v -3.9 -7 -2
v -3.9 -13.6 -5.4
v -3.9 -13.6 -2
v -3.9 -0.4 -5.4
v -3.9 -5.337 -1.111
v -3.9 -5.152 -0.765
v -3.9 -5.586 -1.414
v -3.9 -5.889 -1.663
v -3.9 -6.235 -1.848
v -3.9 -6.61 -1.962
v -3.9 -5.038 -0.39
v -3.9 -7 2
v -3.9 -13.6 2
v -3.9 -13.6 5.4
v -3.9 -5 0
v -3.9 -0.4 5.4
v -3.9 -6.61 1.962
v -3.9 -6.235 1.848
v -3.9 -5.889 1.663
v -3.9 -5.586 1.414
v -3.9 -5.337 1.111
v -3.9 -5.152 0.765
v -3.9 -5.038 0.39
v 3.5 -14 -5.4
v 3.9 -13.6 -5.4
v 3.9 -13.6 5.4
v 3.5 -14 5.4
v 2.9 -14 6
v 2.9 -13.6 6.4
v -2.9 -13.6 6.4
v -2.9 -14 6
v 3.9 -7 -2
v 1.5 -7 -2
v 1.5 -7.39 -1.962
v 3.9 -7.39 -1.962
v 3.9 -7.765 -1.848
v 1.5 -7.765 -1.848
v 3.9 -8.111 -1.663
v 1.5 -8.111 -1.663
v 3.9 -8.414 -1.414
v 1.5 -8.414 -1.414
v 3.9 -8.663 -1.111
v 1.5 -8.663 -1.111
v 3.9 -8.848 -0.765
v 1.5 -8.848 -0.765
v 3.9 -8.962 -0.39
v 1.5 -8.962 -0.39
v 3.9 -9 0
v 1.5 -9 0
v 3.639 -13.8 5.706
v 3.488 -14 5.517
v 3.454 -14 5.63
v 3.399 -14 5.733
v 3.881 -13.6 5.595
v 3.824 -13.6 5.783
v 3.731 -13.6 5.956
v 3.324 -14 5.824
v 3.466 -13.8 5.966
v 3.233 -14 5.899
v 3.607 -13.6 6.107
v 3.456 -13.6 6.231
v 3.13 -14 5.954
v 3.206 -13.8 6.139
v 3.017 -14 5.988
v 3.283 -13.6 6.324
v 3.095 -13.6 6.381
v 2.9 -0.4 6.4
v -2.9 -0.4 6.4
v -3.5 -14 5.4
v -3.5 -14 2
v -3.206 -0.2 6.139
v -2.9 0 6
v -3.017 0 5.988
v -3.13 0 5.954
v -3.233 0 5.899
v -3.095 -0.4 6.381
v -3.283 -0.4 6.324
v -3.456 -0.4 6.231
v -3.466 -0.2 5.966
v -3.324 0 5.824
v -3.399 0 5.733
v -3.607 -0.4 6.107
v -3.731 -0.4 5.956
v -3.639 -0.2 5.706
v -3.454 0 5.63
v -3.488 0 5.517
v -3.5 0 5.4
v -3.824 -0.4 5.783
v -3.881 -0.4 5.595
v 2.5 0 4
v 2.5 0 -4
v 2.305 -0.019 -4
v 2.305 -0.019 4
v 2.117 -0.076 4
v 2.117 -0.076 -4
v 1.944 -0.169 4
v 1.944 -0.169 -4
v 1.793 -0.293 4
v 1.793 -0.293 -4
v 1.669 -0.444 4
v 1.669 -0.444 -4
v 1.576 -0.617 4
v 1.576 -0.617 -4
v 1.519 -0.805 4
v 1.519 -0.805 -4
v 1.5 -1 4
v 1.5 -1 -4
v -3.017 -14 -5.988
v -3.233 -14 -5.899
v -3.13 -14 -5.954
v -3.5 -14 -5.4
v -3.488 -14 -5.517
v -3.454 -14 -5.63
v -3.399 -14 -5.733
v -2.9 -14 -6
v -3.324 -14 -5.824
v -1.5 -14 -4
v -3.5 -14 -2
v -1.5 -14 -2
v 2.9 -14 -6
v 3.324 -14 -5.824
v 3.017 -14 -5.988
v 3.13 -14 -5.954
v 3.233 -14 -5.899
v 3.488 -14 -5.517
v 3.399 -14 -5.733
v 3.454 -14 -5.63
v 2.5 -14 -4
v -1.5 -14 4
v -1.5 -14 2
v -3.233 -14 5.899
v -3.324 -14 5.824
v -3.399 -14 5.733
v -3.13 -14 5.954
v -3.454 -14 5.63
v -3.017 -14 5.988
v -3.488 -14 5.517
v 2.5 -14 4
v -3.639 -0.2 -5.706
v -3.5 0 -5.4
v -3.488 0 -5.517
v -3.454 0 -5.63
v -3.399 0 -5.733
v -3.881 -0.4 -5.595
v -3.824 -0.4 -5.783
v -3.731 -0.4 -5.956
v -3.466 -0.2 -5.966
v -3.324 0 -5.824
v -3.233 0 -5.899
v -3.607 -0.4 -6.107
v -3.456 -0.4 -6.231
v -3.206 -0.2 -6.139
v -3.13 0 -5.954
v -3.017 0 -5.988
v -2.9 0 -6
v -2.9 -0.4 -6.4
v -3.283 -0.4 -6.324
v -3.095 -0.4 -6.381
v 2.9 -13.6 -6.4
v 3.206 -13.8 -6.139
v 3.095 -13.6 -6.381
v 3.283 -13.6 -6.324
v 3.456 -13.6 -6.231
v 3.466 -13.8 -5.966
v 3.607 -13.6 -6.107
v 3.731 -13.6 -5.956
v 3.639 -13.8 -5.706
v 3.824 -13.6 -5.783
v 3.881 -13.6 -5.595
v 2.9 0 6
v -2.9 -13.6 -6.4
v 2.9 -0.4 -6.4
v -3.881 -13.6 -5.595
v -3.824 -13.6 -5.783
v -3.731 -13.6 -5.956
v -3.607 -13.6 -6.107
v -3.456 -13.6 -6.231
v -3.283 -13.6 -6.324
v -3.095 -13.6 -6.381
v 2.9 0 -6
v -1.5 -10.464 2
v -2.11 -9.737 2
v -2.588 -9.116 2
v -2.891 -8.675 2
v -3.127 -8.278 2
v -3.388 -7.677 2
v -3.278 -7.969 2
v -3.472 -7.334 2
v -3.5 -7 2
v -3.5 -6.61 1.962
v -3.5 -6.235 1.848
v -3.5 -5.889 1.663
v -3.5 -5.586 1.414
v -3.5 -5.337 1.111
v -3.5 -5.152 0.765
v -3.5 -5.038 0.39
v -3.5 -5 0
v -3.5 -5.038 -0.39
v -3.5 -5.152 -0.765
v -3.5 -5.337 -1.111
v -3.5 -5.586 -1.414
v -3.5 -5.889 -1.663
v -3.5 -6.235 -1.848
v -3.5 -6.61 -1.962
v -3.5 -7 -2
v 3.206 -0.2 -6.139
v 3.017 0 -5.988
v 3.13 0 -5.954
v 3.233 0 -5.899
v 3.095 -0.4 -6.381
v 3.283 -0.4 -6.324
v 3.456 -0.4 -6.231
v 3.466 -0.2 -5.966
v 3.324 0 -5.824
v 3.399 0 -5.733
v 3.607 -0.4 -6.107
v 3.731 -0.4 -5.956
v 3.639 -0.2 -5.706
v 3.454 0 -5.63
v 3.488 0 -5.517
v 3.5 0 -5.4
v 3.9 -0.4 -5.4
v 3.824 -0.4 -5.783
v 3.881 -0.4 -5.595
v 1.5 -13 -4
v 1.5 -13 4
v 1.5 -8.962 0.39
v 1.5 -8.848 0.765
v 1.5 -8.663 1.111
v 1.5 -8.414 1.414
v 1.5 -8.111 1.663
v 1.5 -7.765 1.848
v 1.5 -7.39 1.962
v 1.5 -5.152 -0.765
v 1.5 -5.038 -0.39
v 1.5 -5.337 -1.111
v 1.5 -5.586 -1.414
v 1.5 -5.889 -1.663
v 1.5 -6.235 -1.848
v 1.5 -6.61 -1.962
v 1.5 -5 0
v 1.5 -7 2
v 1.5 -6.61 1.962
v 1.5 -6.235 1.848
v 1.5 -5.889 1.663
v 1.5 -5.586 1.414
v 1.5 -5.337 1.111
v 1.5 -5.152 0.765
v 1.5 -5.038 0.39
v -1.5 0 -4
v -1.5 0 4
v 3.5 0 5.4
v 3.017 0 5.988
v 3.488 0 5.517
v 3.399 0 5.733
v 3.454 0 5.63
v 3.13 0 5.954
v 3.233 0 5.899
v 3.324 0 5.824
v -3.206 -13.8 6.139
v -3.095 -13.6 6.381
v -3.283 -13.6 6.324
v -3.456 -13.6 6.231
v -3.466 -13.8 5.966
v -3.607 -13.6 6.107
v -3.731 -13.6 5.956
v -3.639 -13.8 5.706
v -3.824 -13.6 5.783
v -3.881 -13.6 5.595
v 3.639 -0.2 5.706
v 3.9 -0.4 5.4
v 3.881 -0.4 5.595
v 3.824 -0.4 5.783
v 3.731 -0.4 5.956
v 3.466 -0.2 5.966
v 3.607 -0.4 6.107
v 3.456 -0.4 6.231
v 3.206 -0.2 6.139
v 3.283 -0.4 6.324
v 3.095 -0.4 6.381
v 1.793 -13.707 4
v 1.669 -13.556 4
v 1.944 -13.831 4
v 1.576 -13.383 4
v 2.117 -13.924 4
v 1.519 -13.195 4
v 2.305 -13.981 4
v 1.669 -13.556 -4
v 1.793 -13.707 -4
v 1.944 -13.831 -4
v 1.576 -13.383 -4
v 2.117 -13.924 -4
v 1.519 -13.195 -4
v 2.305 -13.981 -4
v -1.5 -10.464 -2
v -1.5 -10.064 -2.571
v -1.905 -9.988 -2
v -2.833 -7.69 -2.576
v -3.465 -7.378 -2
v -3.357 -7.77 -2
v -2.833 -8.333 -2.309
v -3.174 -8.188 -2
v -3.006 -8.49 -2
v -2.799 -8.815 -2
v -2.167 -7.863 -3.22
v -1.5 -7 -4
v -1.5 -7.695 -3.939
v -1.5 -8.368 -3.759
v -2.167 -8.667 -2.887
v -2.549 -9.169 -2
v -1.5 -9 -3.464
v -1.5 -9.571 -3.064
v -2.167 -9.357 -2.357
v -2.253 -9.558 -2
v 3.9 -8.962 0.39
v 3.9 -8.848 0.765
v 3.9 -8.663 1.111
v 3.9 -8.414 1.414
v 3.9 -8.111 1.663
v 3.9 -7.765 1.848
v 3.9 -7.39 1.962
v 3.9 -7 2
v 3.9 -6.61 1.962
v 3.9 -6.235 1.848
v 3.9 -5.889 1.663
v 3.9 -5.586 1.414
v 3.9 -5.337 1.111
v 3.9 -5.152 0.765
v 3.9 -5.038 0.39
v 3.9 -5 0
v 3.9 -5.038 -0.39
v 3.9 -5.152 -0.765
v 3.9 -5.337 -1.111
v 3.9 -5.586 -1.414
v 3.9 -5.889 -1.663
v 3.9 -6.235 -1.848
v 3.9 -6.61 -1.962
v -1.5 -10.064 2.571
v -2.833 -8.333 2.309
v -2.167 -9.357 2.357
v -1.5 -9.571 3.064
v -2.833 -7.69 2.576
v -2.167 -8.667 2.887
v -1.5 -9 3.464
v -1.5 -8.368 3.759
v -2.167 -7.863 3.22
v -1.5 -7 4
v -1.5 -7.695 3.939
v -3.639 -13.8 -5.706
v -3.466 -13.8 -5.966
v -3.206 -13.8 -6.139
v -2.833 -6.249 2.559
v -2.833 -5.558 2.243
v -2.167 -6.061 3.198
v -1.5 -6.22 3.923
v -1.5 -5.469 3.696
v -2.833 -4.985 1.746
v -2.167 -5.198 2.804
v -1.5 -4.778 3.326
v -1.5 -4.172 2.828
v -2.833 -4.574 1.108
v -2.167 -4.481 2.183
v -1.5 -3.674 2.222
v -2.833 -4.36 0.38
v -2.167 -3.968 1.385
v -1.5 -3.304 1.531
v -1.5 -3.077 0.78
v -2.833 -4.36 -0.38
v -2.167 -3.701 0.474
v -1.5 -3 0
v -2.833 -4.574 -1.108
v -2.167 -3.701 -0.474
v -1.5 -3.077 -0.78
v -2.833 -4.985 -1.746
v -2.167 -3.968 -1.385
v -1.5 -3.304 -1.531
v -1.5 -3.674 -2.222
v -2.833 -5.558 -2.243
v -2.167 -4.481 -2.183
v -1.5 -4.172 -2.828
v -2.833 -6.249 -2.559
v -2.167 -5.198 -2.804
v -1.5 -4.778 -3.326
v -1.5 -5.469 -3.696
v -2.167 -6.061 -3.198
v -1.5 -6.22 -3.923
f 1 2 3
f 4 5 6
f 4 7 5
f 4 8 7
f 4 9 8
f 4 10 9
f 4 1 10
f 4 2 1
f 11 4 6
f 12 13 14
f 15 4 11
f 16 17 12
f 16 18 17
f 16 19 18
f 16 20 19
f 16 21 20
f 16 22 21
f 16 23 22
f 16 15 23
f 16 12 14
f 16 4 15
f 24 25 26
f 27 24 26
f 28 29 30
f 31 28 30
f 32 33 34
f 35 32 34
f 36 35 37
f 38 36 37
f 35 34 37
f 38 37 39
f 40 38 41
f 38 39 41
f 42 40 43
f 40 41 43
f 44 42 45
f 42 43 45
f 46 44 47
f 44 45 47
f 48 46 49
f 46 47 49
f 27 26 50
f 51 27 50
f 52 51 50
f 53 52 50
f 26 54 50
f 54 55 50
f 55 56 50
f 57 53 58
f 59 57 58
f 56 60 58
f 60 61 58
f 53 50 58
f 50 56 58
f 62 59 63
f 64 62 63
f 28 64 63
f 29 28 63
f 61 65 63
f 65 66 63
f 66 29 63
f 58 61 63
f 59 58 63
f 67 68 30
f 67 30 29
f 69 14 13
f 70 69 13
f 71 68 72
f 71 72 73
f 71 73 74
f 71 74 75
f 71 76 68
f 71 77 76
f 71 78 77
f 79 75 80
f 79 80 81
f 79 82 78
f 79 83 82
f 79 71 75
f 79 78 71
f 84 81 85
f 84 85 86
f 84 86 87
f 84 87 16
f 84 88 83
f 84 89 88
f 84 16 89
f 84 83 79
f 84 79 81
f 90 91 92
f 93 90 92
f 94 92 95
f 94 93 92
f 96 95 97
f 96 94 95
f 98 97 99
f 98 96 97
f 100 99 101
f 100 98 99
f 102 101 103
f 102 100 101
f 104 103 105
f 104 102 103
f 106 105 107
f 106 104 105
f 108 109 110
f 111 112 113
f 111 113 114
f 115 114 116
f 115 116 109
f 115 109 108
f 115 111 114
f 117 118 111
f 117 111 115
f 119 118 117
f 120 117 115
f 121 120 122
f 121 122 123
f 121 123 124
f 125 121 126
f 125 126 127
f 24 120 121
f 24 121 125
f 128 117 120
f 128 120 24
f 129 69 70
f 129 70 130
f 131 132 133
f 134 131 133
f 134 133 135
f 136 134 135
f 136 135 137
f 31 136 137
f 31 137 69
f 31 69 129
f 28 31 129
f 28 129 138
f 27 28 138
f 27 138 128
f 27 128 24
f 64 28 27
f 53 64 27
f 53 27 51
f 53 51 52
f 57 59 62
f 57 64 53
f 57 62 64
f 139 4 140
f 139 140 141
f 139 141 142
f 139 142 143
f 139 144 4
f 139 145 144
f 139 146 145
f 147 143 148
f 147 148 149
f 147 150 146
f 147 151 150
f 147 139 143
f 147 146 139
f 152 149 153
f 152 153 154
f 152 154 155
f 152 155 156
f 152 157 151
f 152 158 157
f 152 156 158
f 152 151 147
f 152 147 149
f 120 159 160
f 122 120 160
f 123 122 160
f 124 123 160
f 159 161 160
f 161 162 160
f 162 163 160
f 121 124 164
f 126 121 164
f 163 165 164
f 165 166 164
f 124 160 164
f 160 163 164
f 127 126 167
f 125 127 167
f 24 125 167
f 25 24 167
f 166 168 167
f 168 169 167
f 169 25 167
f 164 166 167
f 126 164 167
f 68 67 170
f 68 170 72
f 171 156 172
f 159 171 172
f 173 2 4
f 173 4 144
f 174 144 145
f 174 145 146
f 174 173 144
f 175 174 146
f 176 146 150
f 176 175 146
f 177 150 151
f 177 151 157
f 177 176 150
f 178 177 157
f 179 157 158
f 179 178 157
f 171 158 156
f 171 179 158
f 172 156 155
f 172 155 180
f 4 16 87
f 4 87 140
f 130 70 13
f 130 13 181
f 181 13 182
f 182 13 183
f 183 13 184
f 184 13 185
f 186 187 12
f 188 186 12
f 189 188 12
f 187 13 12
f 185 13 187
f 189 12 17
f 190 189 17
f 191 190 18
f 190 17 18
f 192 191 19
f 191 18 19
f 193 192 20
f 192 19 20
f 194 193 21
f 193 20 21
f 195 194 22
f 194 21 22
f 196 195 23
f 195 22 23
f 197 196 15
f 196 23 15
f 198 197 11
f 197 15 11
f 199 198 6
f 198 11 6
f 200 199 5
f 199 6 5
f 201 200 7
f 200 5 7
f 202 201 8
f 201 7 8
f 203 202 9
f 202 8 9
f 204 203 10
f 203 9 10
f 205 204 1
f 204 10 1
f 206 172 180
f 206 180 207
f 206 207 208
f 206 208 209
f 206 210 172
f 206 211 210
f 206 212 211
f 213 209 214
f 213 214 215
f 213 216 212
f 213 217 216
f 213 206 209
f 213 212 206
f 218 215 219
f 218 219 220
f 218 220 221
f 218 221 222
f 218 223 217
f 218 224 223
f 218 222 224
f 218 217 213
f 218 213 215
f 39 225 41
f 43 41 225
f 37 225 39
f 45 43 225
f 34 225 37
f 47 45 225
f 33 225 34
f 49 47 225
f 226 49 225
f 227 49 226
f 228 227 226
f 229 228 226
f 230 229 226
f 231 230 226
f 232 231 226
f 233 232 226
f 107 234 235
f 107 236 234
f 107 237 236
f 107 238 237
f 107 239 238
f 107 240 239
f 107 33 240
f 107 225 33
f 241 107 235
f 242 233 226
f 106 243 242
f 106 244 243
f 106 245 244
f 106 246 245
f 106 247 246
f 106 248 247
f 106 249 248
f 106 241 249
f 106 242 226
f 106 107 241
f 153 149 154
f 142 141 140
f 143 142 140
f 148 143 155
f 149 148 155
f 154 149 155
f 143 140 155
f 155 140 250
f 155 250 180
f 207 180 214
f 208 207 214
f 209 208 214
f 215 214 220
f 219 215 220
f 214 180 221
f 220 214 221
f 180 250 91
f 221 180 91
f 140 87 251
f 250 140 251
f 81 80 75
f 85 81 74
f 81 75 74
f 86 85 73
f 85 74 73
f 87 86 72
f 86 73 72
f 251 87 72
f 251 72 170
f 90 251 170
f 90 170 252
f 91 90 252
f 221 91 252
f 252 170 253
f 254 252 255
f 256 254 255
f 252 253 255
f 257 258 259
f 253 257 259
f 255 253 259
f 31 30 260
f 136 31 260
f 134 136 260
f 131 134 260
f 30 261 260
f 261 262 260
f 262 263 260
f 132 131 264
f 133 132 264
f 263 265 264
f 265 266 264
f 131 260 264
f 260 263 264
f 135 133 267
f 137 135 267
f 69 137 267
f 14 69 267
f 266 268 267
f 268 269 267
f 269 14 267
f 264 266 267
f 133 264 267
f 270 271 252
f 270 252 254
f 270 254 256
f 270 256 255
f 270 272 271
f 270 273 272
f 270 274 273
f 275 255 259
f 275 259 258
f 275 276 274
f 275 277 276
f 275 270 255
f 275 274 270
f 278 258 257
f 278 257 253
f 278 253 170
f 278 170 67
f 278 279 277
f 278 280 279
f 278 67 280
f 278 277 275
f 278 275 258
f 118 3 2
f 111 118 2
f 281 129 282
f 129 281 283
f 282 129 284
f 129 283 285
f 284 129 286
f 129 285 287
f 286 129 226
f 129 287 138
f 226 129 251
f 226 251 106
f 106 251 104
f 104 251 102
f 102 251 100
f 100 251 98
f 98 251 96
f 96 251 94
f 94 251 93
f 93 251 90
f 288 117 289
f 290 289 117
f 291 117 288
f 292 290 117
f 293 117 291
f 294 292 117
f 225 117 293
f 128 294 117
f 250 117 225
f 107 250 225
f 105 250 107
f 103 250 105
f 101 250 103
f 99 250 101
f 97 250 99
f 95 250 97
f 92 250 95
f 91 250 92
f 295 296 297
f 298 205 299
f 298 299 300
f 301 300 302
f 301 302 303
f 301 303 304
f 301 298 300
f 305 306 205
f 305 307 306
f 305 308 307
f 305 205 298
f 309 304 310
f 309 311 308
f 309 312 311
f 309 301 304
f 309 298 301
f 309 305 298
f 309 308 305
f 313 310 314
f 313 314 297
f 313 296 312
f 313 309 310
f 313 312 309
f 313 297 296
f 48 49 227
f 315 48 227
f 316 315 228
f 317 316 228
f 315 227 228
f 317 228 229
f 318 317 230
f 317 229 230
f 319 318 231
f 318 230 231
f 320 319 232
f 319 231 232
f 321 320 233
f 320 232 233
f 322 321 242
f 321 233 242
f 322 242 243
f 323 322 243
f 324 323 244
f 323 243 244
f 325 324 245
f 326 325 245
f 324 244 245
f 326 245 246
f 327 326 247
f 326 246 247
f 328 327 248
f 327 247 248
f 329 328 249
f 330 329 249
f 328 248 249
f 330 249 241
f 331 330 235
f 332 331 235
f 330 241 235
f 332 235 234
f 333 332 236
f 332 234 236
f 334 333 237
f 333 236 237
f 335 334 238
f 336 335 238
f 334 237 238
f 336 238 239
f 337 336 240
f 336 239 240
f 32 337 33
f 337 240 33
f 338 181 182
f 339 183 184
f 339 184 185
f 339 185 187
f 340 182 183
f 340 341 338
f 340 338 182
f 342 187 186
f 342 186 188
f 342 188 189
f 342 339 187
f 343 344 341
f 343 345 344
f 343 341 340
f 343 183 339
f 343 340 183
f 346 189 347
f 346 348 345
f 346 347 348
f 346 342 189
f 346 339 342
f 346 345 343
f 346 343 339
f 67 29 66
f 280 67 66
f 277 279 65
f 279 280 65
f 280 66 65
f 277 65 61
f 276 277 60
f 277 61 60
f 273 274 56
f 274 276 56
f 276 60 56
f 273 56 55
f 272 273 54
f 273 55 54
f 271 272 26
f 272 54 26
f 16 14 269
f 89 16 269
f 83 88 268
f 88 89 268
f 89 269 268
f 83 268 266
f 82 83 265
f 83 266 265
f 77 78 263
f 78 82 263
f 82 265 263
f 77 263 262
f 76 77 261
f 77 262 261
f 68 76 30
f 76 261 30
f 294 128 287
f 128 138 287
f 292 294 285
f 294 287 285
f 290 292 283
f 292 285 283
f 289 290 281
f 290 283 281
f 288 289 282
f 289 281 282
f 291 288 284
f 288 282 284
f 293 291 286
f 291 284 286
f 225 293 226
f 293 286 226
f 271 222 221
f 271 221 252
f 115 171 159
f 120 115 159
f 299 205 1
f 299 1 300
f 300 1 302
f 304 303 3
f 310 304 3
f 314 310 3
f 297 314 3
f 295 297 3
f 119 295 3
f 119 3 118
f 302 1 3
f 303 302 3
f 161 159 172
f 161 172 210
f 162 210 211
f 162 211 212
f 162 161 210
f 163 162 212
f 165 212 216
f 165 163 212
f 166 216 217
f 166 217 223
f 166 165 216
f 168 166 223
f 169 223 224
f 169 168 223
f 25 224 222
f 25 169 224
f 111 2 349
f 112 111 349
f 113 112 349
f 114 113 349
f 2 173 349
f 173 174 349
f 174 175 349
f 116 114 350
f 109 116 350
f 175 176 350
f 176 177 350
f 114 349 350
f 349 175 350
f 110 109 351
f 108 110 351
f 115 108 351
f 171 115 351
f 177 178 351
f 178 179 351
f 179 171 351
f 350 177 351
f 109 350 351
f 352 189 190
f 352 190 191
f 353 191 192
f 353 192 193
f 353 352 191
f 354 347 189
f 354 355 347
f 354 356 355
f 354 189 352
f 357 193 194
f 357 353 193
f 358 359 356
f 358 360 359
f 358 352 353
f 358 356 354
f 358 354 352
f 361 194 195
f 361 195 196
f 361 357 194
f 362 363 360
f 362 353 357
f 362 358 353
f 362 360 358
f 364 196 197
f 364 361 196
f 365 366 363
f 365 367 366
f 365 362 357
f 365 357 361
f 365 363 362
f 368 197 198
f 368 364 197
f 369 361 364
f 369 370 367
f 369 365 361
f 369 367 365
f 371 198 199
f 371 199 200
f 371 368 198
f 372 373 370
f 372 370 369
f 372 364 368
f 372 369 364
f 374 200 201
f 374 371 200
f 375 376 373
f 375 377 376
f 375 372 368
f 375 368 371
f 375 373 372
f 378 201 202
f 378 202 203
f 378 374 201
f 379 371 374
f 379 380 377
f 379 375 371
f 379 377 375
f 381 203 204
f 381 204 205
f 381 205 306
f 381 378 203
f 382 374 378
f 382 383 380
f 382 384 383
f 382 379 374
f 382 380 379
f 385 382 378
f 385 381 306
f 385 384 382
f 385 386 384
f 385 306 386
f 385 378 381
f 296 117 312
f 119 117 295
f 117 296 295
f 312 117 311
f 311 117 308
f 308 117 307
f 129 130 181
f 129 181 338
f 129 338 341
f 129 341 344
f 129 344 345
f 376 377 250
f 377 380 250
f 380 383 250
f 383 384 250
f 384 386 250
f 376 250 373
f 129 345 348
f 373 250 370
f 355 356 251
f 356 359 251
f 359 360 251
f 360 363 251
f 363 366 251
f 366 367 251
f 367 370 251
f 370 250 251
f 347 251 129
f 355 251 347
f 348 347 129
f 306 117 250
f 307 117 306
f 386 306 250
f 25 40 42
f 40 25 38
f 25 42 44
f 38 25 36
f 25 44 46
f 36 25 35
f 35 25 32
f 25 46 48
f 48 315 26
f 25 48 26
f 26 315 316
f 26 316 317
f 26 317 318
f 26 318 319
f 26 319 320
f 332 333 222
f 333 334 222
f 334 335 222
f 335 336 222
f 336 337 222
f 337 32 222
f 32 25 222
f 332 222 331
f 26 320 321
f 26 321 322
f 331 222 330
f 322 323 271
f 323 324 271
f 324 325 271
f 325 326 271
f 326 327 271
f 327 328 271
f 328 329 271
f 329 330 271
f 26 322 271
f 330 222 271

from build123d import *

# Parameters (mm, degrees)
F0_W     = 7.8
F0_H     = 12.8
F0_W_2   = 3
F0_H_2   = 8
F1_DEPTH = 14
F3_DEPTH = 7.801
F4_SIZE  = 1.99999
F5_R     = 1
F6_SIZE  = 0.4
F7_R     = 1
F8_DEPTH = 2.4


# Not quite as in the source:
# - a fillet or chamfer is up to 0.001 mm smaller than in the source, because OpenCascade refuses the exact size


with BuildPart() as f1:
    # F0 (on Front) → F1 (new body)
    with BuildSketch(Plane.XZ):
        Rectangle(F0_W, F0_H)
        Rectangle(F0_W_2, F0_H_2, mode=Mode.SUBTRACT)
    extrude(amount=F1_DEPTH)

    # F2 (on face) → F3 (cut, through all)
    with BuildSketch(Plane(origin=(-3.9, 0, 0), x_dir=(0, -1, 0), z_dir=(-1, 0, 0))):
        with BuildLine():
            Line((7, -2), (7, 2))
            ThreePointArc((7, 2), (5, 0), (7, -2))
        make_face()
        with BuildLine():
            ThreePointArc((7, -2), (8.4142135624, -1.4142135624), (9, 0))
            ThreePointArc((9, 0), (8.4142135624, 1.4142135624), (7, 2))
            Line((7, 2), (7, -2))
        make_face()
    extrude(amount=-F3_DEPTH, mode=Mode.SUBTRACT)

    # F4 (size 2 in the source; OpenCascade refuses exactly that, so slightly less here)
    f4_edges = [f1.edges().sort_by_distance(p)[0] for p in [
        (-1.5, -7, 2),
    ]]
    chamfer(f4_edges, length=F4_SIZE)

    # F5
    f5_edges = [f1.edges().sort_by_distance(p)[0] for p in [
        (3.9, -7, 6.4),
        (3.9, -7, -6.4),
        (-3.9, -7, -6.4),
        (-3.9, -7, 6.4),
    ]]
    fillet(f5_edges, radius=F5_R)

    # F6
    f6_edges = [f1.edges().sort_by_distance(p)[0] for p in [
        (3.9, -14, 0),
        (3.9, 0, 0),
    ]]
    chamfer(f6_edges, length=F6_SIZE)

    # F7
    f7_edges = [f1.edges().sort_by_distance(p)[0] for p in [
        (1.5, -14, 0),
        (1.5, 0, 0),
    ]]
    fillet(f7_edges, radius=F7_R)

    # F2 (on face) → F8 (cut, through all)
    with BuildSketch(Plane(origin=(-3.9, 0, 0), x_dir=(0, -1, 0), z_dir=(-1, 0, 0))):
        with BuildLine():
            ThreePointArc((7, 2), (8.4142135624, 1.4142135624), (9, 0))
            ThreePointArc((9, 0), (8.4142135624, -1.4142135624), (7, -2))
            Line((7, -2), (14, -2))
            Line((14, -2), (14, 2))
            Line((14, 2), (7, 2))
        make_face()
    extrude(amount=-F8_DEPTH, mode=Mode.SUBTRACT)


solid = f1.part
